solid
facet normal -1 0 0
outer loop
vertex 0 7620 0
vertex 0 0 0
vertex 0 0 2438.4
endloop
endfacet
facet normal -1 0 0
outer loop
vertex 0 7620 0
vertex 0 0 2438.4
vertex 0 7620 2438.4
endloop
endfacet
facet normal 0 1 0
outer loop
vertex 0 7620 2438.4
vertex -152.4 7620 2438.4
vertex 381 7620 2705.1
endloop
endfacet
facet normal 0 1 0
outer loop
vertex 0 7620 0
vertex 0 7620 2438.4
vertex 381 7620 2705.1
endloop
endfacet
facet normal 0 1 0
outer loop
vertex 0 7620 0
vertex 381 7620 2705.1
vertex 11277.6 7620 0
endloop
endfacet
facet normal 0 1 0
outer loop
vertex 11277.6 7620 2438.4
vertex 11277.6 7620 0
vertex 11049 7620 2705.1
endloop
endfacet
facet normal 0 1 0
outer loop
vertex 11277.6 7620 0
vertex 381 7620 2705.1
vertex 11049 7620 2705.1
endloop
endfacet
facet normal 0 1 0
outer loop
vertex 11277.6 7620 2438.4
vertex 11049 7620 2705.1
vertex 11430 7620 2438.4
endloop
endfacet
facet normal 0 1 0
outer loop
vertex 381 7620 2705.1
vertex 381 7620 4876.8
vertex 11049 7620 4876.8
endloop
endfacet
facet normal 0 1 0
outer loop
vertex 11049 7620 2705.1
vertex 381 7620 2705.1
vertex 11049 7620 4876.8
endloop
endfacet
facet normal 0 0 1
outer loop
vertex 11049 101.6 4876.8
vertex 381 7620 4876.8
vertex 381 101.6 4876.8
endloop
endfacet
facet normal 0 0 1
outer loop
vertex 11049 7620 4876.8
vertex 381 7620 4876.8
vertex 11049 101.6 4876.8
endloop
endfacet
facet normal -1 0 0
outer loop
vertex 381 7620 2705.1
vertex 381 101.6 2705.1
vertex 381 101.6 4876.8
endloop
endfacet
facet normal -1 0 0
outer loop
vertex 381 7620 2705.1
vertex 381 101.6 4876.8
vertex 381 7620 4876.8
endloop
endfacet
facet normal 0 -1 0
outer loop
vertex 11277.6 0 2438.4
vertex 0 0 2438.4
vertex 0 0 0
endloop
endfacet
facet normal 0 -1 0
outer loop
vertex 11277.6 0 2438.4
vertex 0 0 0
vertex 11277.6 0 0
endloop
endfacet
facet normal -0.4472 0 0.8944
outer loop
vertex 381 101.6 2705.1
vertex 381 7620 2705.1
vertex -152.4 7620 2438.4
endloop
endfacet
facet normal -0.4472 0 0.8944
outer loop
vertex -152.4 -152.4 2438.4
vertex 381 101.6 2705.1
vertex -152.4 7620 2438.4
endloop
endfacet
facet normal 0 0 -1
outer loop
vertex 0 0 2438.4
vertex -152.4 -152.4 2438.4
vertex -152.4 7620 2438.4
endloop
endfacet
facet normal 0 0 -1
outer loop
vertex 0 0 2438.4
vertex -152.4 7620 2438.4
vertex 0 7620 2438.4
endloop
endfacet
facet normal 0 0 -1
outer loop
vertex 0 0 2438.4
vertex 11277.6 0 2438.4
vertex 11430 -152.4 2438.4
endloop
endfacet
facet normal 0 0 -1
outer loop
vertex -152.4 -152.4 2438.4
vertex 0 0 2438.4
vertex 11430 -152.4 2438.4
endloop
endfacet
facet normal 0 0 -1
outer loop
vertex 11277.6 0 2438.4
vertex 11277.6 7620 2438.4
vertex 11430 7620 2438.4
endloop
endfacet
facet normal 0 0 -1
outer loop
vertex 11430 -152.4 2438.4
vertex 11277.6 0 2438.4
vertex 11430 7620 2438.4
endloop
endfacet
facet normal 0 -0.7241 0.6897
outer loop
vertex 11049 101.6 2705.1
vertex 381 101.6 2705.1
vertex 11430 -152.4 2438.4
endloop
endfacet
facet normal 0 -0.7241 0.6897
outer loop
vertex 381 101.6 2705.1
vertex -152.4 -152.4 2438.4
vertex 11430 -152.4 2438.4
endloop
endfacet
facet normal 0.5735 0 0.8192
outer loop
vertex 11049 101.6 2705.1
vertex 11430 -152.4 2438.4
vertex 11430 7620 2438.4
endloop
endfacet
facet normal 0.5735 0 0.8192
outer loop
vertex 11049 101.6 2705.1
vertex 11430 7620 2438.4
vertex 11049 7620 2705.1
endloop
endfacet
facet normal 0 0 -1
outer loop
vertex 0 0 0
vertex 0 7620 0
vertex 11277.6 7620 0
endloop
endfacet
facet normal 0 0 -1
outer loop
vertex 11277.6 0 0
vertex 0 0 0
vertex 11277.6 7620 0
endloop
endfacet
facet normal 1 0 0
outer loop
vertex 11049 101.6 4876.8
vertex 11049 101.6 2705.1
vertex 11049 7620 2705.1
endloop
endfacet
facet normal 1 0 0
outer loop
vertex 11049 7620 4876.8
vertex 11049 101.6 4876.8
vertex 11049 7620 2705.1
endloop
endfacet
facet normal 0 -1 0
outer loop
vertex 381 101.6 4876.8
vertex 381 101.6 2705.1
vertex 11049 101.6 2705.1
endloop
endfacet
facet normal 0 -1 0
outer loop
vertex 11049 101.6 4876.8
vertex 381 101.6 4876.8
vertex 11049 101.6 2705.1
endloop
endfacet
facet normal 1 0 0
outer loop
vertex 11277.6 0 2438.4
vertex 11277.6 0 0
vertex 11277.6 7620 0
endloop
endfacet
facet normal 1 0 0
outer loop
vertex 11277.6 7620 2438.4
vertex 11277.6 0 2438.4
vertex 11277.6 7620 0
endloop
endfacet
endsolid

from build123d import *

# Parameters (mm, degrees)
F0_W          = 11277.6
F0_H          = 7620
F1_DEPTH      = 2438.4
F2_W          = 10668
F2_H          = 7518.4
F3_DEPTH      = 2438.4
F5_DEPTH      = 7620
F5_DEPTH_BACK = 152.4
F7_DEPTH      = 11430.001
F7_DEPTH_BACK = 152.401


with BuildPart() as f1:
    # F0 (on Top) → F1 (new body)
    with BuildSketch(Plane.XY):
        with Locations((5638.8, 3810)):
            Rectangle(F0_W, F0_H)
    extrude(amount=F1_DEPTH)



with BuildPart() as f3:
    # F2 (on face) → F3 (new body)
    with BuildSketch(Plane.XY.offset(2438.4)):
        with Locations((5715, 3860.8)):
            Rectangle(F2_W, F2_H)
    extrude(amount=F3_DEPTH)


with BuildPart() as f1_1:
    add(f1.part)

    add(f3.part)  # F5 merges F3
    # F4 (on Front) → F5 (join, two sides)
    with BuildSketch(Plane.XZ) as f5_sk:
        Polygon((381, 2705.1), (-152.4, 2438.4), (11430, 2438.4), (11049, 2705.1), align=None)
    extrude(amount=-F5_DEPTH)
    extrude(f5_sk.sketch, amount=F5_DEPTH_BACK)

    # F6 (on Right) → F7 (cut, two sides)
    with BuildSketch(Plane.YZ) as f7_sk:
        Polygon((-152.4, 2705.1), (-152.4, 2438.4), (101.6, 2705.1), align=None)
    extrude(amount=F7_DEPTH, mode=Mode.SUBTRACT)
    extrude(f7_sk.sketch, amount=-F7_DEPTH_BACK, mode=Mode.SUBTRACT)


solid = f1_1.part
